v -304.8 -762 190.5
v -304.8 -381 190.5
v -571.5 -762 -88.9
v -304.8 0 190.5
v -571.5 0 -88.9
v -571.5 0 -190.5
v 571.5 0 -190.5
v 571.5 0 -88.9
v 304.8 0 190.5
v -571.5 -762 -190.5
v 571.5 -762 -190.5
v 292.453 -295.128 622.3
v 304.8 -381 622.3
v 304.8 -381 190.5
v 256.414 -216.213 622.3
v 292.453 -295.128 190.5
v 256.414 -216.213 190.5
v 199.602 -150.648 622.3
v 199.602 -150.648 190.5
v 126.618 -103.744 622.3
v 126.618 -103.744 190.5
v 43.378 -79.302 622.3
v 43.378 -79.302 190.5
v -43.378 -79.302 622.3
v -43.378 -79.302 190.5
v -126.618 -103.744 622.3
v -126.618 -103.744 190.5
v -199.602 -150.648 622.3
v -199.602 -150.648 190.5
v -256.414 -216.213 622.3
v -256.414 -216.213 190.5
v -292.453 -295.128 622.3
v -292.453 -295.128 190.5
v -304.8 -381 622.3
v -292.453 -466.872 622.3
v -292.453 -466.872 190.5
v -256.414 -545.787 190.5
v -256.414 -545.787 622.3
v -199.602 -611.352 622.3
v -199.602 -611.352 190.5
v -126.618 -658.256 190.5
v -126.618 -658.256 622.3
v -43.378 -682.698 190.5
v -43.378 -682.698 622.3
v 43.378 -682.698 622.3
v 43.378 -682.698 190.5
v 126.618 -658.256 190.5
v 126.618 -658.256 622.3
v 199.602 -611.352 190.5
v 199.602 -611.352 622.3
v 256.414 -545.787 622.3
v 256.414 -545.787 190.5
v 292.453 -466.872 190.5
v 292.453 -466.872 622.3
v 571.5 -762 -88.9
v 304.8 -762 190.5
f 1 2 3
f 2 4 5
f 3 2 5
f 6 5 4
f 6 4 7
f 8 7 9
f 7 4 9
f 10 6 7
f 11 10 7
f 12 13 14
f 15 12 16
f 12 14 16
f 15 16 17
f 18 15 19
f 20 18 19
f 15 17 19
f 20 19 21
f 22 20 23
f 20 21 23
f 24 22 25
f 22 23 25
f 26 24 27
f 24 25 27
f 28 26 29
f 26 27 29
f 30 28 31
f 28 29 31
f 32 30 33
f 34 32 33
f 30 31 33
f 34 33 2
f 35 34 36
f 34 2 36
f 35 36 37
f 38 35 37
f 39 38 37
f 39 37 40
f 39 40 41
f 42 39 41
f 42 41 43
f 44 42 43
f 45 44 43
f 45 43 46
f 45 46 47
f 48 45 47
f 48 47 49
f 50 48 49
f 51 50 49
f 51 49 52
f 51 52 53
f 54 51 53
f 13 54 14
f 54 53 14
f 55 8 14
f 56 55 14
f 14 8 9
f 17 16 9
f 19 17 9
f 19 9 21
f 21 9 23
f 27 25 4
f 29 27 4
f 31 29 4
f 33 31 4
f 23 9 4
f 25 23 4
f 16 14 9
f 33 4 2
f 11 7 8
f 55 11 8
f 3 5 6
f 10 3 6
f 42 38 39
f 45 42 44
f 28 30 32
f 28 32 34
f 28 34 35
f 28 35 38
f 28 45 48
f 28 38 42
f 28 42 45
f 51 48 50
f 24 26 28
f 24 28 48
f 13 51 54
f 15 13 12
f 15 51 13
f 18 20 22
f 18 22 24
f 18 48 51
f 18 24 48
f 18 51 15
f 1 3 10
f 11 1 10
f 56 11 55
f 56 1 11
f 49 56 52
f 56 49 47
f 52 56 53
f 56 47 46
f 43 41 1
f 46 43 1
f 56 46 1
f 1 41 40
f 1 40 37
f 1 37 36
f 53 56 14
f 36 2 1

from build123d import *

# Parameters (mm, degrees)
F1_DEPTH = 25.4
F2_DEPTH = 762
F3_R     = 304.8
F4_DEPTH = 431.8


with BuildPart() as f1:
    # F0 (on Front) → F1 (new body)
    with BuildSketch(Plane.XZ):
        Polygon((571.5, -88.9), (304.8, 190.5), (-304.8, 190.5), (-571.5, -88.9), (-571.5, -190.5), (571.5, -190.5), align=None)
    extrude(amount=F1_DEPTH)

    # F0 (on Front) → F2 (join)
    with BuildSketch(Plane.XZ):
        Polygon((571.5, -88.9), (304.8, 190.5), (-304.8, 190.5), (-571.5, -88.9), (-571.5, -190.5), (571.5, -190.5), align=None)
    extrude(amount=F2_DEPTH)

    # F3 (on face) → F4 (join)
    with BuildSketch(Plane.XY.offset(190.5)):
        with Locations((0, -381)):
            Circle(F3_R)
        with BuildLine():
            ThreePointArc((-304.8, -381), (0, -685.8), (304.8, -381))
            ThreePointArc((304.8, -381), (0, -76.2), (-304.8, -381))
        make_face()
    extrude(amount=F4_DEPTH)


solid = f1.part
